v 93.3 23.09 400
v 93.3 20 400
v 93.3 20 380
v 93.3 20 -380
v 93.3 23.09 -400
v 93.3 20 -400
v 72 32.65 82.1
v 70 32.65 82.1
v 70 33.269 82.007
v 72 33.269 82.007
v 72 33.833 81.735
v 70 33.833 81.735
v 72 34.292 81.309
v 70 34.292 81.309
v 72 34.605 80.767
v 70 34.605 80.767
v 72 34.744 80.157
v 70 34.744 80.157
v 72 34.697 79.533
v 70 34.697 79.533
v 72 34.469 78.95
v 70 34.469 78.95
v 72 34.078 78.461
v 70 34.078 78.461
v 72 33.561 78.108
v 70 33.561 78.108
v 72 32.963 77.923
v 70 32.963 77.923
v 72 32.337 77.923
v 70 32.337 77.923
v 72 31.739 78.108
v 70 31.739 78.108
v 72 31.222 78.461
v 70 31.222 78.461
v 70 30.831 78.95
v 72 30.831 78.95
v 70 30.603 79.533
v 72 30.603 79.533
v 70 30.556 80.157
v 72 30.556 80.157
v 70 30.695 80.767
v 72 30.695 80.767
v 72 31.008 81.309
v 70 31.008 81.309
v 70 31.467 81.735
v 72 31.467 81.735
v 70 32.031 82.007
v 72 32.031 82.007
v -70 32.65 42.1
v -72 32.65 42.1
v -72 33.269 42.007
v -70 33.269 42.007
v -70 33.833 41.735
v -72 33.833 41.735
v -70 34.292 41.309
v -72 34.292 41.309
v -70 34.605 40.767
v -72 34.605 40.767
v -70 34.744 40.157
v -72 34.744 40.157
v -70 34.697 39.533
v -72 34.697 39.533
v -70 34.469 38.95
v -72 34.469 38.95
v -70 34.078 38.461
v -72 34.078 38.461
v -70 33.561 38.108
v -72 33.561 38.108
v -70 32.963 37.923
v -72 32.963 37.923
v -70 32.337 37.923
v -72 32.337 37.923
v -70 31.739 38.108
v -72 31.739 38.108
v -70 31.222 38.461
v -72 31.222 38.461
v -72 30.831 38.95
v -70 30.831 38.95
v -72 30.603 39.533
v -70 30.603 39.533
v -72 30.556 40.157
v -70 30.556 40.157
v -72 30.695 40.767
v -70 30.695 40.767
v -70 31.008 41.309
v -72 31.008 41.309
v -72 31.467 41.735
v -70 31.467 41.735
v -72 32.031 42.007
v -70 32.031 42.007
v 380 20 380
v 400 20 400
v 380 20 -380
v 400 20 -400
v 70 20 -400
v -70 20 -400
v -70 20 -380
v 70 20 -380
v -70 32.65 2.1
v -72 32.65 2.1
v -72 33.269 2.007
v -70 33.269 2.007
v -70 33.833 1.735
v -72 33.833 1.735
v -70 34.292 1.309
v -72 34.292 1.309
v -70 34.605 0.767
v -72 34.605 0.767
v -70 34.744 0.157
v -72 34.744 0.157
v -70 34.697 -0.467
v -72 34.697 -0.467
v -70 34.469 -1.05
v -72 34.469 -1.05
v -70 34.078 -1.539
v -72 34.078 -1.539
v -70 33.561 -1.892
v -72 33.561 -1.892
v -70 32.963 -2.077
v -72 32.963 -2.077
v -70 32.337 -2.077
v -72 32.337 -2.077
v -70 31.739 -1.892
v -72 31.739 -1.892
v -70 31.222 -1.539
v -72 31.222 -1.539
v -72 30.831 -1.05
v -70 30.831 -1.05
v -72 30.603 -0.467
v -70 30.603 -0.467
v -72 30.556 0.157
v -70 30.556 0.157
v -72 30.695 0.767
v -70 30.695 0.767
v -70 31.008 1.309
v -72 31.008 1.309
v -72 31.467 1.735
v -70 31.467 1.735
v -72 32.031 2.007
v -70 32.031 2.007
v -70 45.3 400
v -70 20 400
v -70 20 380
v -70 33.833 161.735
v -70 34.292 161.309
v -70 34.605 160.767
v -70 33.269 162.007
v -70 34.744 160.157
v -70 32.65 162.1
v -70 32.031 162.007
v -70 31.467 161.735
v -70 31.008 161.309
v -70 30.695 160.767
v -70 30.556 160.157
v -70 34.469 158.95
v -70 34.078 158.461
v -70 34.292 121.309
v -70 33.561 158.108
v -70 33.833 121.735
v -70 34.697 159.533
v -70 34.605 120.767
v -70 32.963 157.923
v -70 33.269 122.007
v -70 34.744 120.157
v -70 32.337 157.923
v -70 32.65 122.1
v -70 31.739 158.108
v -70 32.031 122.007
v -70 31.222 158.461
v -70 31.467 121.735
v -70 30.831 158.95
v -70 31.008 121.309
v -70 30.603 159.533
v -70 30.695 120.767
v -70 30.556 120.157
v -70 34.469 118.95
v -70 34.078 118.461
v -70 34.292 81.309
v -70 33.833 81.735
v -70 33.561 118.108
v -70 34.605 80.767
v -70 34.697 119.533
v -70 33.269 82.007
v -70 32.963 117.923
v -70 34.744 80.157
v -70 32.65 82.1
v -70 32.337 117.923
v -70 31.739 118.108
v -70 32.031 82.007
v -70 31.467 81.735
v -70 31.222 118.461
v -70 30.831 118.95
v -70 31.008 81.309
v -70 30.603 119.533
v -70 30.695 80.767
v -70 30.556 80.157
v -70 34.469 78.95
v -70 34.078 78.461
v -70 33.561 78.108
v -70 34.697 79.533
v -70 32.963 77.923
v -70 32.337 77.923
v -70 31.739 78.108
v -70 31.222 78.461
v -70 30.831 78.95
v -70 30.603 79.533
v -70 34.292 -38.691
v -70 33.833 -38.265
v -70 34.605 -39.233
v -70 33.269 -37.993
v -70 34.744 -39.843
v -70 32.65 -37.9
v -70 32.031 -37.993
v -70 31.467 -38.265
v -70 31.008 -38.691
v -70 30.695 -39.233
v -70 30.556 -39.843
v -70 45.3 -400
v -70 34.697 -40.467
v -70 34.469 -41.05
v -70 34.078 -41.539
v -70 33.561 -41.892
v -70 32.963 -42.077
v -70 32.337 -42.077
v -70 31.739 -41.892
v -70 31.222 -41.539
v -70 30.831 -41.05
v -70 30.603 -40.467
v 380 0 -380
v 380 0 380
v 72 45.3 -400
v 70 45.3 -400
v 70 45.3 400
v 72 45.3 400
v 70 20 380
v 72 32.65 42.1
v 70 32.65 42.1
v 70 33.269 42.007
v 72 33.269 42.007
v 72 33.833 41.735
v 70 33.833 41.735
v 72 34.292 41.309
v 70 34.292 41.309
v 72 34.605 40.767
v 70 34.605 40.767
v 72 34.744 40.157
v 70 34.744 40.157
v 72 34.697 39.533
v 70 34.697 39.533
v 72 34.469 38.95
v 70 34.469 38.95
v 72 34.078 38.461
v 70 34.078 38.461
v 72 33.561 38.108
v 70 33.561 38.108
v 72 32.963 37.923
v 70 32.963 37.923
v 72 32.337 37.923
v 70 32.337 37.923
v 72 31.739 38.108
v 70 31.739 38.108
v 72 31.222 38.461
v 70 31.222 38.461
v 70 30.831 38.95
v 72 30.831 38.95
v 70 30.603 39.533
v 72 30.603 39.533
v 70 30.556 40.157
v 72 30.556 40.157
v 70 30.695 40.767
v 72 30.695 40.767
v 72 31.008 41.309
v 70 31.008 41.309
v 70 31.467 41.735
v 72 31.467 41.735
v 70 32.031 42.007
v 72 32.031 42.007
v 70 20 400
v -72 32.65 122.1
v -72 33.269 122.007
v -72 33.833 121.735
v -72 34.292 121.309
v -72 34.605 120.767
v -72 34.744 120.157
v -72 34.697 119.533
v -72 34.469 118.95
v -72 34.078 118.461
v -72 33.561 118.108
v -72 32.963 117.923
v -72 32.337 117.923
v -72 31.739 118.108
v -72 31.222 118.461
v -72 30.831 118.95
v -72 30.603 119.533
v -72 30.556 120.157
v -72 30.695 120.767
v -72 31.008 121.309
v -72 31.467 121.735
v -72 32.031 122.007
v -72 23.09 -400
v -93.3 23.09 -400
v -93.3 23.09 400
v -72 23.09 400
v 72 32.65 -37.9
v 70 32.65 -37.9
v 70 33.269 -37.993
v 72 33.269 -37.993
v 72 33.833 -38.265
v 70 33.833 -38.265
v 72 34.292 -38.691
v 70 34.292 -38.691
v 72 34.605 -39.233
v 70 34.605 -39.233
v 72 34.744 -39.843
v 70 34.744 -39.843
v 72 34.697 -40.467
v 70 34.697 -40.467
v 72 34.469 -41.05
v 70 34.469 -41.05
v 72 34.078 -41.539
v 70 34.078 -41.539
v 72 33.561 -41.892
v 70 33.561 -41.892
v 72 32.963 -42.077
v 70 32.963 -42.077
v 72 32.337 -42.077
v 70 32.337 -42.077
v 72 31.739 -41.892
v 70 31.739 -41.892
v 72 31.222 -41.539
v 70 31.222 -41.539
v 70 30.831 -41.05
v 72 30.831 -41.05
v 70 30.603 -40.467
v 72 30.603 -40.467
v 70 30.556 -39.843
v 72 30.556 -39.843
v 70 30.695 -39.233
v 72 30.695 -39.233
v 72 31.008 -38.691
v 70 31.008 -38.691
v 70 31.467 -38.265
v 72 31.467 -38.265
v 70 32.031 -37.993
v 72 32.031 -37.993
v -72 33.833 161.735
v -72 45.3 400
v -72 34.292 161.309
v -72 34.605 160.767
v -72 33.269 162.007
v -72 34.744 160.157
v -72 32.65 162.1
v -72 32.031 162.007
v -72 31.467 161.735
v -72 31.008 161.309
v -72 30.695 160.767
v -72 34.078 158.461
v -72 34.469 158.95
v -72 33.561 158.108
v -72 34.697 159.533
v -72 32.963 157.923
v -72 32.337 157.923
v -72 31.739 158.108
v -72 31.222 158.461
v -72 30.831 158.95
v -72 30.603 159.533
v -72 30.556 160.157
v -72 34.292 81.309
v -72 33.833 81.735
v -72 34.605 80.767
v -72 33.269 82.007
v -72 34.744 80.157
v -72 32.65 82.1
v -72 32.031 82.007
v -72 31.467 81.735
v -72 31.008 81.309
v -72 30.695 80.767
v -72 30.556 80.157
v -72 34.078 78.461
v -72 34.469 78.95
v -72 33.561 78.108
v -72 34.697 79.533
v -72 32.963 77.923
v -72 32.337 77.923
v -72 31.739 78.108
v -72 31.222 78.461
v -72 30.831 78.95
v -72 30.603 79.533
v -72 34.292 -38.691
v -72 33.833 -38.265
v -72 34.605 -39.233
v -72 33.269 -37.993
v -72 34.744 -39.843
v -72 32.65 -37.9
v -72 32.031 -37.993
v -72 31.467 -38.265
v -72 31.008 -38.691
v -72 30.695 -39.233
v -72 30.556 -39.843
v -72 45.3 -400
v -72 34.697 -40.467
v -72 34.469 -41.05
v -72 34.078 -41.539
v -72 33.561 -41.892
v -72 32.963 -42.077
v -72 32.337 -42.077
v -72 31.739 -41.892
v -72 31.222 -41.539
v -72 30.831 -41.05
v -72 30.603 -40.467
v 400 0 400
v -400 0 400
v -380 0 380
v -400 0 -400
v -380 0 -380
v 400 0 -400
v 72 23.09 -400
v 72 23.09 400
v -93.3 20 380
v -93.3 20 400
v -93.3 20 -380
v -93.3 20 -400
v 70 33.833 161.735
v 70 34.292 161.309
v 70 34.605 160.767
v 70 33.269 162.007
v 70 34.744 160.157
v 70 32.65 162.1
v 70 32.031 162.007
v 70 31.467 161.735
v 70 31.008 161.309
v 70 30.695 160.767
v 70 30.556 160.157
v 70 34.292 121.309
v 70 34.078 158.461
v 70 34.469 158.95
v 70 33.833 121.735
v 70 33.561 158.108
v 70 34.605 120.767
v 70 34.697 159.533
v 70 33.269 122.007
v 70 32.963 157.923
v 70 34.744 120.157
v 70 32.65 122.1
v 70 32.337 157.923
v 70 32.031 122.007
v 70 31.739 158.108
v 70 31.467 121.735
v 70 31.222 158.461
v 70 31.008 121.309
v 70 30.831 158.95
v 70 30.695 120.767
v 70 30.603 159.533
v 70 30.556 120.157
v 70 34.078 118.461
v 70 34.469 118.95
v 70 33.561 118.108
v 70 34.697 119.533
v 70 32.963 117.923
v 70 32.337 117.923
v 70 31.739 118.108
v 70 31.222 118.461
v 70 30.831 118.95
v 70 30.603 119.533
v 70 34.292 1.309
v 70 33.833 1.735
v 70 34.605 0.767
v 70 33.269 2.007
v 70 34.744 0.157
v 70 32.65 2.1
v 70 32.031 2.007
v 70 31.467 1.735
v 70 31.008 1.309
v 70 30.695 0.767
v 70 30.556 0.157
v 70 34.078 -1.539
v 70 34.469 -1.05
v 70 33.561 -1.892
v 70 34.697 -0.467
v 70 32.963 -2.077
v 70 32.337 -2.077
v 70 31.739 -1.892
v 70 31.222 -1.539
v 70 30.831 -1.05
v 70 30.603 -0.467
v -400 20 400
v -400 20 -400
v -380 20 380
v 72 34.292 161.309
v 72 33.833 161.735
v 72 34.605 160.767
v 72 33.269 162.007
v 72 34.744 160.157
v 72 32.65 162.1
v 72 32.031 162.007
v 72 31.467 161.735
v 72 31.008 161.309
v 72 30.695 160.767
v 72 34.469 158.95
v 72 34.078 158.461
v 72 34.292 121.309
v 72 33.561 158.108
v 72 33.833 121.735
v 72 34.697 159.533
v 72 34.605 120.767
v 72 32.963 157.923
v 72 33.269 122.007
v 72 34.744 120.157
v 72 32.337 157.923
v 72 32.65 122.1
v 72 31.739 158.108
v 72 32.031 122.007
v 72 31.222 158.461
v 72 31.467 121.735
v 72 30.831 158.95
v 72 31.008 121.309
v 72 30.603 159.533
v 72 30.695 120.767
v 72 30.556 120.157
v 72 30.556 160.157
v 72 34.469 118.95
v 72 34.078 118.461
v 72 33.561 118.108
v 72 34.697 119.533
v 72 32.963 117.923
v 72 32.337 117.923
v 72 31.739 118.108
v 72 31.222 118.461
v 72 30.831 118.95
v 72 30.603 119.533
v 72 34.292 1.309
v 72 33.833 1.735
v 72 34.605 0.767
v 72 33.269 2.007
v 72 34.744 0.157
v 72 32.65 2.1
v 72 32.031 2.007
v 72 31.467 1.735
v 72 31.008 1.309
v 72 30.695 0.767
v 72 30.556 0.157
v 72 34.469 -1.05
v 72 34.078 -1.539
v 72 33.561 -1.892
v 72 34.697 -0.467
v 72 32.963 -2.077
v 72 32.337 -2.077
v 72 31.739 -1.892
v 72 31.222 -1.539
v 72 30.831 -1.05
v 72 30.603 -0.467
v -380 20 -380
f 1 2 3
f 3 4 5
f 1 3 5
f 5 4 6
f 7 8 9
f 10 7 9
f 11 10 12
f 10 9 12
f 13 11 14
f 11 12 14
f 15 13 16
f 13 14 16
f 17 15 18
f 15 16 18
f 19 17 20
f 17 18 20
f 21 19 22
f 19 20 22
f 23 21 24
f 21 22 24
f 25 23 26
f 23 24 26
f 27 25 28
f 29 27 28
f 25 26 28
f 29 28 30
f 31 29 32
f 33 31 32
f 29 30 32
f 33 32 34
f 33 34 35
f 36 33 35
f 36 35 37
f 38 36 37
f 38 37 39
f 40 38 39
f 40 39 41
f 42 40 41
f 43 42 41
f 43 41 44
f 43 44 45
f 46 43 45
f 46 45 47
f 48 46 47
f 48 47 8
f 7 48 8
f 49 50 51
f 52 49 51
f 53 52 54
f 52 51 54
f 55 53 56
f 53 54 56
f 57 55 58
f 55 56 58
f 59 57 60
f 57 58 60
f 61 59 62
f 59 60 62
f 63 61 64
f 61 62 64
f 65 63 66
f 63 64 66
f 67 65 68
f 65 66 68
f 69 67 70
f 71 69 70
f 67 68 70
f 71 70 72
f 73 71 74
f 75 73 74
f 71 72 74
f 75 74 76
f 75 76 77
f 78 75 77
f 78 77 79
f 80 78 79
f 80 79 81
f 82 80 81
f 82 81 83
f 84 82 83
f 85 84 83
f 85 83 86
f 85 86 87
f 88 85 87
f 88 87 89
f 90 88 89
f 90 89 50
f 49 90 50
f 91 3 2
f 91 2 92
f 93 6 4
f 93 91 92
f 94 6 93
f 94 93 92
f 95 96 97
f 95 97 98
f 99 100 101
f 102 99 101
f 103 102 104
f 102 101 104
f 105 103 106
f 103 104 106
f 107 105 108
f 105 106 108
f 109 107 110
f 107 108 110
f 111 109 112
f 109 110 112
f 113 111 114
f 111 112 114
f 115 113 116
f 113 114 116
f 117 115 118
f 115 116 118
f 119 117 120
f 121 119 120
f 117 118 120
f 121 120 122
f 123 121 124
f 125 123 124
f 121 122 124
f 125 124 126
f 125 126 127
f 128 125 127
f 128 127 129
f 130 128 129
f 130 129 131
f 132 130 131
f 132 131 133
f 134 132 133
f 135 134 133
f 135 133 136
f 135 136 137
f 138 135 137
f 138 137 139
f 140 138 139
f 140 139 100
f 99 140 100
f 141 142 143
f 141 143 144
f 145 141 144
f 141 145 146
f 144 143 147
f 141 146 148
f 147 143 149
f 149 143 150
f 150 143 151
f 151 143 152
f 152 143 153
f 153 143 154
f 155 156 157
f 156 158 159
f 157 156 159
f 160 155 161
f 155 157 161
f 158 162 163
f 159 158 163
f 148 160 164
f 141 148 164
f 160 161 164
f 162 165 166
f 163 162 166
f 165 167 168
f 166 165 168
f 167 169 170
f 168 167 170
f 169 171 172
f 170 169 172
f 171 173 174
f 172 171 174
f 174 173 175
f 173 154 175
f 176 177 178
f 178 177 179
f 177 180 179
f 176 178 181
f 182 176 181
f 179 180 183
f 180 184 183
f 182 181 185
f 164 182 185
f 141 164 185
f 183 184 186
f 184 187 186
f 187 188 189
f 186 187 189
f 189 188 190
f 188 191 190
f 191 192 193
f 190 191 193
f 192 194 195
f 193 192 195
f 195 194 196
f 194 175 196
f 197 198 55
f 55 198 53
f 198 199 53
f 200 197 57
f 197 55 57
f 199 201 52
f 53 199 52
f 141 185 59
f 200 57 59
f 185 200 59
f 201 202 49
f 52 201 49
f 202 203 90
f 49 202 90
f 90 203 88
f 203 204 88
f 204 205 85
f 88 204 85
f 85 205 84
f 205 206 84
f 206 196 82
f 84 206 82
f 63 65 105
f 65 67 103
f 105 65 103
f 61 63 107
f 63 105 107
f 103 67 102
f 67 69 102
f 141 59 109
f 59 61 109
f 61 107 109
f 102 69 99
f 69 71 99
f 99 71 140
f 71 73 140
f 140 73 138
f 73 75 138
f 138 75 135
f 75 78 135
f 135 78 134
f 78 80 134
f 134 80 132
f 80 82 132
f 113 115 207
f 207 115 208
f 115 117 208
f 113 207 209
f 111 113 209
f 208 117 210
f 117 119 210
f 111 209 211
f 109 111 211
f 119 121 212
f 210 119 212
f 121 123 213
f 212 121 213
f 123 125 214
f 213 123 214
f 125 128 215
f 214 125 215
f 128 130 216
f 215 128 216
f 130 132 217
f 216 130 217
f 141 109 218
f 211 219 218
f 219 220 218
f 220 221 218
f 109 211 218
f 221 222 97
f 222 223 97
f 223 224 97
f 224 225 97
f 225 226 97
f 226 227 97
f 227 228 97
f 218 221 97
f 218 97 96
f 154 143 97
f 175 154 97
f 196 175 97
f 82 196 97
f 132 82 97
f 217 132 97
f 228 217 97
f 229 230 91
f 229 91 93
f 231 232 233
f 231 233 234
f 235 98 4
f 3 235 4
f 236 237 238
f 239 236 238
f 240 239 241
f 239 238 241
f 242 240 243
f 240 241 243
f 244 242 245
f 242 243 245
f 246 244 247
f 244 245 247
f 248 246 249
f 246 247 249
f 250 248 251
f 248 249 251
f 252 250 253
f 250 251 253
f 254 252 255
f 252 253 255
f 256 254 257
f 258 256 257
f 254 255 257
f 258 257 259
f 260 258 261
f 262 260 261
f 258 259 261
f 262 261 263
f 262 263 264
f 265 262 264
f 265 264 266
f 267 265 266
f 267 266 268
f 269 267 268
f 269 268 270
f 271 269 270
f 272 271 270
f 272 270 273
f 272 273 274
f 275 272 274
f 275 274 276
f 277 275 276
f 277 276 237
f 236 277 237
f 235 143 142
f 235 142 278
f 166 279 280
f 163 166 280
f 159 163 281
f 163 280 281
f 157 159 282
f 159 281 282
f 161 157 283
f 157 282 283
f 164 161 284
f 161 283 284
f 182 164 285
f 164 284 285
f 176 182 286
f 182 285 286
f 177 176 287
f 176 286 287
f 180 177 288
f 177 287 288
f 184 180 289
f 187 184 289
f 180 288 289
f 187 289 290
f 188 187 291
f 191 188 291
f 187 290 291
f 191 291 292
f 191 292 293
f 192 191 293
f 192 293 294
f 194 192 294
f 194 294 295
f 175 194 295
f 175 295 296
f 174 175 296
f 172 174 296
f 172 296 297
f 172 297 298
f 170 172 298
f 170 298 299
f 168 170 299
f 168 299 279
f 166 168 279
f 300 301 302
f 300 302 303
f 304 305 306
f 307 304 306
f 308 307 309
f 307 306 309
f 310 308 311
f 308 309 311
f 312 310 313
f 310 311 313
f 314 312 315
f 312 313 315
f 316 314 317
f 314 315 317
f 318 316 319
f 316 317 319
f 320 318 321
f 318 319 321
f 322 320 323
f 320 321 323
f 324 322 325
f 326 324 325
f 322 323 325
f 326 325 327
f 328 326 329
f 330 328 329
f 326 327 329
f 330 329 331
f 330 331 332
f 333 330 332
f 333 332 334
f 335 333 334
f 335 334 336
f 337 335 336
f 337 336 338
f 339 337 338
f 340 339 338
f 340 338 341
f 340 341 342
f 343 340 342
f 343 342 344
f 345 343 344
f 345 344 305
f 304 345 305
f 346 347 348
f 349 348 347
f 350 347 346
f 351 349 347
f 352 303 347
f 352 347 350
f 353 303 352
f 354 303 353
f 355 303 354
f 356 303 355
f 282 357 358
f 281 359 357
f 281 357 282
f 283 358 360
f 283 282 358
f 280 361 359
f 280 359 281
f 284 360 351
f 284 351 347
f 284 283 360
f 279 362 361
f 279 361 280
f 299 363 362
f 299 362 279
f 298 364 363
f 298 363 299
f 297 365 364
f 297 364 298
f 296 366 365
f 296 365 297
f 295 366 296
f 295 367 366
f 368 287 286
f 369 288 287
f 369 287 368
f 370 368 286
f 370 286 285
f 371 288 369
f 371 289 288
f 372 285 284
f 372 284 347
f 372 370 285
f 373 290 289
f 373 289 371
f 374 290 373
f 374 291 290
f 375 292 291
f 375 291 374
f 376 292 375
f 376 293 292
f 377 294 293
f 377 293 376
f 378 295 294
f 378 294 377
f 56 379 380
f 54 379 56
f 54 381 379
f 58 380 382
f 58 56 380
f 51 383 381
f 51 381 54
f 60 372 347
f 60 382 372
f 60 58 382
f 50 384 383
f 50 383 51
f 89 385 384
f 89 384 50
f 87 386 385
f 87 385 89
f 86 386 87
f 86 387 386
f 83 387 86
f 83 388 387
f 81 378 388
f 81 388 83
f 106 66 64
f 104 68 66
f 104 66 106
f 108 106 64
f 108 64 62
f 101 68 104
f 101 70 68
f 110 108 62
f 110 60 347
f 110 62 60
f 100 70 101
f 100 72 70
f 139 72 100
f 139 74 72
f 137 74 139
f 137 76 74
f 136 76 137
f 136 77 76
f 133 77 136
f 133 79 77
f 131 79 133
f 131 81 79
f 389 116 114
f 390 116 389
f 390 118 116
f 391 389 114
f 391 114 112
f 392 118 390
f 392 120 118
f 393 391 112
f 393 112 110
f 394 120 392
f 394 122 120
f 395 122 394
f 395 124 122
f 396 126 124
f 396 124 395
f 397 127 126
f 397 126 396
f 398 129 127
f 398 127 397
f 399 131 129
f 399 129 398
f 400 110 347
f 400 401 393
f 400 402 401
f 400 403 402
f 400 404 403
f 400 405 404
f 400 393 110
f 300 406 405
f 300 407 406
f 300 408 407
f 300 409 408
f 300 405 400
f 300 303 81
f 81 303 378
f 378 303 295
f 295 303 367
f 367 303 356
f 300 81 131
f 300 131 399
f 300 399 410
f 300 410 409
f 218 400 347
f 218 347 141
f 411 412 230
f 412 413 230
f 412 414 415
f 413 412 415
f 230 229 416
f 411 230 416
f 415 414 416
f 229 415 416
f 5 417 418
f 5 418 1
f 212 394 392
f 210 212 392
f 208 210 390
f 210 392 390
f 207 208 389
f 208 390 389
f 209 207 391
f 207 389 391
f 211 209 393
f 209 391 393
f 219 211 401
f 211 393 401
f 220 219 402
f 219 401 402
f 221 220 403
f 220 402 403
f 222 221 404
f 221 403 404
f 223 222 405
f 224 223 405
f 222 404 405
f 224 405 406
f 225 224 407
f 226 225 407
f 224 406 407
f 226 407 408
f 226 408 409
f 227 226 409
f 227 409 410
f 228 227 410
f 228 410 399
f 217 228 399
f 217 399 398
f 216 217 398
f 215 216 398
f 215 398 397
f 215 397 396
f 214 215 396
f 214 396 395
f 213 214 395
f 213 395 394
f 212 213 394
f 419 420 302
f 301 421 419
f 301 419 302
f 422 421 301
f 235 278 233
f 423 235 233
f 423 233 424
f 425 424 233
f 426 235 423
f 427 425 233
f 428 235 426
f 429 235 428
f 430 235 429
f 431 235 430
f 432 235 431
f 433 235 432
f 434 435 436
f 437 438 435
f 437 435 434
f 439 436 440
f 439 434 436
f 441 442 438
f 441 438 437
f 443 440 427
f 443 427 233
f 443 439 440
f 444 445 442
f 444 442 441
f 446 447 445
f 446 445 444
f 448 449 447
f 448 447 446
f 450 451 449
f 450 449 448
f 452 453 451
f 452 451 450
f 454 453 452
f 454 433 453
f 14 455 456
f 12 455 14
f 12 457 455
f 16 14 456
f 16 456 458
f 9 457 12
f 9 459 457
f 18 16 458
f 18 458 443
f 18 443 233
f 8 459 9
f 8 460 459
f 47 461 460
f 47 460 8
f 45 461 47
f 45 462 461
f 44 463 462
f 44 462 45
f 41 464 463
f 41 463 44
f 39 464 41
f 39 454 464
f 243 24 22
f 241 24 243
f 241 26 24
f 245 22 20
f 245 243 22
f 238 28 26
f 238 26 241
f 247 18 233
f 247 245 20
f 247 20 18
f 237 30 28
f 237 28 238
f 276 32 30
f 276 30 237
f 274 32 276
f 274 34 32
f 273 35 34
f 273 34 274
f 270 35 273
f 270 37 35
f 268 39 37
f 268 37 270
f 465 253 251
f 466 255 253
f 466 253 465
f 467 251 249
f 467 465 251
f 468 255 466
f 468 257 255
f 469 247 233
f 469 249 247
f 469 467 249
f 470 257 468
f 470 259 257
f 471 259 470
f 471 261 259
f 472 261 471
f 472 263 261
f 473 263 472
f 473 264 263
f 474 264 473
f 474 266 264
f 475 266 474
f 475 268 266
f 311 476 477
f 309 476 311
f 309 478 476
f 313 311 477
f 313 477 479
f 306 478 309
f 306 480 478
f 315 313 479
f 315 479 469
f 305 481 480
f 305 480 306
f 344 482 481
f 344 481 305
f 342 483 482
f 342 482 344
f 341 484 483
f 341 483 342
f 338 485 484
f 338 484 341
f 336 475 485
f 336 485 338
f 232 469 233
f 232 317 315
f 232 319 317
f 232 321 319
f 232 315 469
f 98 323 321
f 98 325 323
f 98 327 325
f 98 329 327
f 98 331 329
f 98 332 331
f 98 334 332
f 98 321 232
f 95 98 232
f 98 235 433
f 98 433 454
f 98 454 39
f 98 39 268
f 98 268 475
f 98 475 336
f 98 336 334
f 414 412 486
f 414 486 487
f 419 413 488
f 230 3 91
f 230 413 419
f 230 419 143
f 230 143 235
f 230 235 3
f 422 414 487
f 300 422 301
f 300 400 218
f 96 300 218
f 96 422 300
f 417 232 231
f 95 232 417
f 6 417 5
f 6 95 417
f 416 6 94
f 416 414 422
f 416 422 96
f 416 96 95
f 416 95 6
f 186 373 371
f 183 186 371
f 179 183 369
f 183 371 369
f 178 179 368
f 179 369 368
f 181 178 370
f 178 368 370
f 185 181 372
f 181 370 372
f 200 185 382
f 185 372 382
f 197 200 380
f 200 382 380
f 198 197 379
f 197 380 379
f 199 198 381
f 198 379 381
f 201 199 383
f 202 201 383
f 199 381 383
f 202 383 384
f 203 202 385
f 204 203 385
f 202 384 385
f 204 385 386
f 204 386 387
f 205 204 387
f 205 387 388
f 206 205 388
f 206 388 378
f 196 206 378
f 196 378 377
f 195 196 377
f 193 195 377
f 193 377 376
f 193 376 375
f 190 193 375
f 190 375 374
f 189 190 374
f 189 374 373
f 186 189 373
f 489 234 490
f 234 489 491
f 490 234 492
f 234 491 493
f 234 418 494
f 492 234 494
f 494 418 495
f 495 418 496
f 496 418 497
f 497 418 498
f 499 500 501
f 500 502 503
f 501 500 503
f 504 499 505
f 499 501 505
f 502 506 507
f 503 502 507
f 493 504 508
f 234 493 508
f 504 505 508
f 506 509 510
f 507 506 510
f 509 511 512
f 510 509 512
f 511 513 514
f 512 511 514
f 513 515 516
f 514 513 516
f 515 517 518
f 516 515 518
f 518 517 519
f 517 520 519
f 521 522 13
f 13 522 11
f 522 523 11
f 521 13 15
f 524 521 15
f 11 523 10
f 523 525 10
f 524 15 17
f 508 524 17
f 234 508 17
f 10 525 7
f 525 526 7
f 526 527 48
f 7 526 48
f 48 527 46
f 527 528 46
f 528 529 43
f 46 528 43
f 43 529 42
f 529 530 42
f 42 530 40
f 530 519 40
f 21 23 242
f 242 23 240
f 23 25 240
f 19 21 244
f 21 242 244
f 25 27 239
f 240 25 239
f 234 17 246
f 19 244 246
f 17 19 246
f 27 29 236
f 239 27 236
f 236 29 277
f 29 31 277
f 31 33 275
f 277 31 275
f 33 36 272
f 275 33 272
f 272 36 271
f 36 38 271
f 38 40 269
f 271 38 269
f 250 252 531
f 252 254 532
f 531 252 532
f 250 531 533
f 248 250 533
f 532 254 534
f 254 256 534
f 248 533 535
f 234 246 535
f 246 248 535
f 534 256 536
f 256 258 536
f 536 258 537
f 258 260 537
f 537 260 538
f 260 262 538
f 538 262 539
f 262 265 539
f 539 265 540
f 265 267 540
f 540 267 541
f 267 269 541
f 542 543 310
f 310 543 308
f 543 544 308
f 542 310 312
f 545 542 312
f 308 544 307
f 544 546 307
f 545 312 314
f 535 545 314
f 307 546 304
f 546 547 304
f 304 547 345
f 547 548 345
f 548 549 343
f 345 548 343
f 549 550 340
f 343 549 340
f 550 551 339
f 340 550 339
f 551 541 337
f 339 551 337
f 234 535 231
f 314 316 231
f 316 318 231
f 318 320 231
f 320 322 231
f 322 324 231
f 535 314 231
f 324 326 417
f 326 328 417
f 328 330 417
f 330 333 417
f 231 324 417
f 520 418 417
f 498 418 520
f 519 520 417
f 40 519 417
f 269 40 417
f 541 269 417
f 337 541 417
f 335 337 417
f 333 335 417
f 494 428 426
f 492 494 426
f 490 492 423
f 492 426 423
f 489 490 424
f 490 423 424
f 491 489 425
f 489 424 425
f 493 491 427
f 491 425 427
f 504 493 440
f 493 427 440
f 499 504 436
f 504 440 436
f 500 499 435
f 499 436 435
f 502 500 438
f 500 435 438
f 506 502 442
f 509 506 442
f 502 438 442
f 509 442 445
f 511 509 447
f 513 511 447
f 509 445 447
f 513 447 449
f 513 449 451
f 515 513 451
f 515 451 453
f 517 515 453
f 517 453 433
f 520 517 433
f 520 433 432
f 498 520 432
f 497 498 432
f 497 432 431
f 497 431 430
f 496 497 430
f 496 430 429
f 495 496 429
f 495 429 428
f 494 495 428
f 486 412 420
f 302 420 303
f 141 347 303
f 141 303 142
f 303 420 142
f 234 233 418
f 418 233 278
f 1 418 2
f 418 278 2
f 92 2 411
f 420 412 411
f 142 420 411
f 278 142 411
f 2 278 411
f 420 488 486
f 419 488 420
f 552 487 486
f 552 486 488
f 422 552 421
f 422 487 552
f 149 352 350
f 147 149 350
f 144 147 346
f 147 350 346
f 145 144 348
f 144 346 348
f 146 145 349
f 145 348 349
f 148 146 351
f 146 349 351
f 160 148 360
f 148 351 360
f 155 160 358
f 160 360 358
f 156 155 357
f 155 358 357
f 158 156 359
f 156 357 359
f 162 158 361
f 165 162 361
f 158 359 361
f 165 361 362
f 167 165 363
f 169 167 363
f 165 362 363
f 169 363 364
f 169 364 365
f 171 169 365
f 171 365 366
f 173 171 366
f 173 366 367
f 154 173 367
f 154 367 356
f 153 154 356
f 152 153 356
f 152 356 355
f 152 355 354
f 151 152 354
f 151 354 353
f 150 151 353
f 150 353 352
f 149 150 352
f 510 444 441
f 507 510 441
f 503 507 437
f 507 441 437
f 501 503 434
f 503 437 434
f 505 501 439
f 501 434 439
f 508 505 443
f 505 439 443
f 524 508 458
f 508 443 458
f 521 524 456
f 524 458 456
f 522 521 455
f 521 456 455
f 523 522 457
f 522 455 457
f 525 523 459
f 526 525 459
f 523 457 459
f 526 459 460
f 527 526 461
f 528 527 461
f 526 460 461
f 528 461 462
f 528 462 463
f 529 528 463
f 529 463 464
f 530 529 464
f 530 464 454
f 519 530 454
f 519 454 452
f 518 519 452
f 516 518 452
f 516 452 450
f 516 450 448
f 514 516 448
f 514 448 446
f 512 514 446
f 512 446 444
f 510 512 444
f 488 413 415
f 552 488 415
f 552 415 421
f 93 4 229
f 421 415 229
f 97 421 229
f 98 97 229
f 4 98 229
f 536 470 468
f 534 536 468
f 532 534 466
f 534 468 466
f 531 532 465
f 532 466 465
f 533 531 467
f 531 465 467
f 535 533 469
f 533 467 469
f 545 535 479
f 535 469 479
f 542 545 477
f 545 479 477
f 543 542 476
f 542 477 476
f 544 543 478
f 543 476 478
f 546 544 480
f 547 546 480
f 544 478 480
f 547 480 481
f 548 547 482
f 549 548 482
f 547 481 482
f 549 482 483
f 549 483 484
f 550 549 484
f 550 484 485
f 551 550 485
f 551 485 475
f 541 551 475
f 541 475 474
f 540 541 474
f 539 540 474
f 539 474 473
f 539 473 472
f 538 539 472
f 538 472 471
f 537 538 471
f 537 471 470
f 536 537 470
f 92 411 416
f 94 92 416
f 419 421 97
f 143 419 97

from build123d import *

# Parameters (mm, degrees)
SKETCH1_W           = 800
SKETCH1_H           = 800
SKETCH1_W_2         = 760
SKETCH1_H_2         = 760
BOSS_EXTRUDE1_DEPTH = 20
SKETCH2_W           = 2
SKETCH2_H           = 800
BOSS_EXTRUDE2_DEPTH = 25.3
SKETCH3_R           = 2.1
CUT_EXTRUDE2_DEPTH  = 158
SKETCH4_W           = 21.3
SKETCH4_H           = 800
BOSS_EXTRUDE3_DEPTH = 3.09


with BuildPart() as part:
    # Sketch1 → Boss-Extrude1 (new body)
    with BuildSketch(Plane(origin=(0, 0, 0), x_dir=(1, 0, 0), z_dir=(0, 1, 0))):
        Rectangle(SKETCH1_W, SKETCH1_H)
        Rectangle(SKETCH1_W_2, SKETCH1_H_2, mode=Mode.SUBTRACT)
    extrude(amount=BOSS_EXTRUDE1_DEPTH)

    # Sketch2 → Boss-Extrude2 (add)
    with BuildSketch(Plane(origin=(0, 20, 0), x_dir=(1, 0, 0), z_dir=(0, 1, 0))):
        with Locations((-71, 0)):
            Rectangle(SKETCH2_W, SKETCH2_H)
        with Locations((71, 0)):
            Rectangle(SKETCH2_W, SKETCH2_H)
    extrude(amount=BOSS_EXTRUDE2_DEPTH)

    # Sketch3 → Cut-Extrude2 (cut)
    with BuildSketch(Plane.ZY.offset(72)):
        with Locations((0, 32.65)):
            Circle(SKETCH3_R)
        with Locations((-40, 32.65)):
            Circle(SKETCH3_R)
        with Locations((40, 32.65)):
            Circle(SKETCH3_R)
        with Locations((80, 32.65)):
            Circle(SKETCH3_R)
        with Locations((120, 32.65)):
            Circle(SKETCH3_R)
        with Locations((160, 32.65)):
            Circle(SKETCH3_R)
    extrude(amount=-CUT_EXTRUDE2_DEPTH, mode=Mode.SUBTRACT)

    # Sketch4 → Boss-Extrude3 (add)
    with BuildSketch(Plane(origin=(0, 20, 0), x_dir=(1, 0, 0), z_dir=(0, 1, 0))):
        with Locations((82.65, 0)):
            Rectangle(SKETCH4_W, SKETCH4_H)
        with Locations((-82.65, 0)):
            Rectangle(SKETCH4_W, SKETCH4_H)
    extrude(amount=BOSS_EXTRUDE3_DEPTH)


solid = part.part
